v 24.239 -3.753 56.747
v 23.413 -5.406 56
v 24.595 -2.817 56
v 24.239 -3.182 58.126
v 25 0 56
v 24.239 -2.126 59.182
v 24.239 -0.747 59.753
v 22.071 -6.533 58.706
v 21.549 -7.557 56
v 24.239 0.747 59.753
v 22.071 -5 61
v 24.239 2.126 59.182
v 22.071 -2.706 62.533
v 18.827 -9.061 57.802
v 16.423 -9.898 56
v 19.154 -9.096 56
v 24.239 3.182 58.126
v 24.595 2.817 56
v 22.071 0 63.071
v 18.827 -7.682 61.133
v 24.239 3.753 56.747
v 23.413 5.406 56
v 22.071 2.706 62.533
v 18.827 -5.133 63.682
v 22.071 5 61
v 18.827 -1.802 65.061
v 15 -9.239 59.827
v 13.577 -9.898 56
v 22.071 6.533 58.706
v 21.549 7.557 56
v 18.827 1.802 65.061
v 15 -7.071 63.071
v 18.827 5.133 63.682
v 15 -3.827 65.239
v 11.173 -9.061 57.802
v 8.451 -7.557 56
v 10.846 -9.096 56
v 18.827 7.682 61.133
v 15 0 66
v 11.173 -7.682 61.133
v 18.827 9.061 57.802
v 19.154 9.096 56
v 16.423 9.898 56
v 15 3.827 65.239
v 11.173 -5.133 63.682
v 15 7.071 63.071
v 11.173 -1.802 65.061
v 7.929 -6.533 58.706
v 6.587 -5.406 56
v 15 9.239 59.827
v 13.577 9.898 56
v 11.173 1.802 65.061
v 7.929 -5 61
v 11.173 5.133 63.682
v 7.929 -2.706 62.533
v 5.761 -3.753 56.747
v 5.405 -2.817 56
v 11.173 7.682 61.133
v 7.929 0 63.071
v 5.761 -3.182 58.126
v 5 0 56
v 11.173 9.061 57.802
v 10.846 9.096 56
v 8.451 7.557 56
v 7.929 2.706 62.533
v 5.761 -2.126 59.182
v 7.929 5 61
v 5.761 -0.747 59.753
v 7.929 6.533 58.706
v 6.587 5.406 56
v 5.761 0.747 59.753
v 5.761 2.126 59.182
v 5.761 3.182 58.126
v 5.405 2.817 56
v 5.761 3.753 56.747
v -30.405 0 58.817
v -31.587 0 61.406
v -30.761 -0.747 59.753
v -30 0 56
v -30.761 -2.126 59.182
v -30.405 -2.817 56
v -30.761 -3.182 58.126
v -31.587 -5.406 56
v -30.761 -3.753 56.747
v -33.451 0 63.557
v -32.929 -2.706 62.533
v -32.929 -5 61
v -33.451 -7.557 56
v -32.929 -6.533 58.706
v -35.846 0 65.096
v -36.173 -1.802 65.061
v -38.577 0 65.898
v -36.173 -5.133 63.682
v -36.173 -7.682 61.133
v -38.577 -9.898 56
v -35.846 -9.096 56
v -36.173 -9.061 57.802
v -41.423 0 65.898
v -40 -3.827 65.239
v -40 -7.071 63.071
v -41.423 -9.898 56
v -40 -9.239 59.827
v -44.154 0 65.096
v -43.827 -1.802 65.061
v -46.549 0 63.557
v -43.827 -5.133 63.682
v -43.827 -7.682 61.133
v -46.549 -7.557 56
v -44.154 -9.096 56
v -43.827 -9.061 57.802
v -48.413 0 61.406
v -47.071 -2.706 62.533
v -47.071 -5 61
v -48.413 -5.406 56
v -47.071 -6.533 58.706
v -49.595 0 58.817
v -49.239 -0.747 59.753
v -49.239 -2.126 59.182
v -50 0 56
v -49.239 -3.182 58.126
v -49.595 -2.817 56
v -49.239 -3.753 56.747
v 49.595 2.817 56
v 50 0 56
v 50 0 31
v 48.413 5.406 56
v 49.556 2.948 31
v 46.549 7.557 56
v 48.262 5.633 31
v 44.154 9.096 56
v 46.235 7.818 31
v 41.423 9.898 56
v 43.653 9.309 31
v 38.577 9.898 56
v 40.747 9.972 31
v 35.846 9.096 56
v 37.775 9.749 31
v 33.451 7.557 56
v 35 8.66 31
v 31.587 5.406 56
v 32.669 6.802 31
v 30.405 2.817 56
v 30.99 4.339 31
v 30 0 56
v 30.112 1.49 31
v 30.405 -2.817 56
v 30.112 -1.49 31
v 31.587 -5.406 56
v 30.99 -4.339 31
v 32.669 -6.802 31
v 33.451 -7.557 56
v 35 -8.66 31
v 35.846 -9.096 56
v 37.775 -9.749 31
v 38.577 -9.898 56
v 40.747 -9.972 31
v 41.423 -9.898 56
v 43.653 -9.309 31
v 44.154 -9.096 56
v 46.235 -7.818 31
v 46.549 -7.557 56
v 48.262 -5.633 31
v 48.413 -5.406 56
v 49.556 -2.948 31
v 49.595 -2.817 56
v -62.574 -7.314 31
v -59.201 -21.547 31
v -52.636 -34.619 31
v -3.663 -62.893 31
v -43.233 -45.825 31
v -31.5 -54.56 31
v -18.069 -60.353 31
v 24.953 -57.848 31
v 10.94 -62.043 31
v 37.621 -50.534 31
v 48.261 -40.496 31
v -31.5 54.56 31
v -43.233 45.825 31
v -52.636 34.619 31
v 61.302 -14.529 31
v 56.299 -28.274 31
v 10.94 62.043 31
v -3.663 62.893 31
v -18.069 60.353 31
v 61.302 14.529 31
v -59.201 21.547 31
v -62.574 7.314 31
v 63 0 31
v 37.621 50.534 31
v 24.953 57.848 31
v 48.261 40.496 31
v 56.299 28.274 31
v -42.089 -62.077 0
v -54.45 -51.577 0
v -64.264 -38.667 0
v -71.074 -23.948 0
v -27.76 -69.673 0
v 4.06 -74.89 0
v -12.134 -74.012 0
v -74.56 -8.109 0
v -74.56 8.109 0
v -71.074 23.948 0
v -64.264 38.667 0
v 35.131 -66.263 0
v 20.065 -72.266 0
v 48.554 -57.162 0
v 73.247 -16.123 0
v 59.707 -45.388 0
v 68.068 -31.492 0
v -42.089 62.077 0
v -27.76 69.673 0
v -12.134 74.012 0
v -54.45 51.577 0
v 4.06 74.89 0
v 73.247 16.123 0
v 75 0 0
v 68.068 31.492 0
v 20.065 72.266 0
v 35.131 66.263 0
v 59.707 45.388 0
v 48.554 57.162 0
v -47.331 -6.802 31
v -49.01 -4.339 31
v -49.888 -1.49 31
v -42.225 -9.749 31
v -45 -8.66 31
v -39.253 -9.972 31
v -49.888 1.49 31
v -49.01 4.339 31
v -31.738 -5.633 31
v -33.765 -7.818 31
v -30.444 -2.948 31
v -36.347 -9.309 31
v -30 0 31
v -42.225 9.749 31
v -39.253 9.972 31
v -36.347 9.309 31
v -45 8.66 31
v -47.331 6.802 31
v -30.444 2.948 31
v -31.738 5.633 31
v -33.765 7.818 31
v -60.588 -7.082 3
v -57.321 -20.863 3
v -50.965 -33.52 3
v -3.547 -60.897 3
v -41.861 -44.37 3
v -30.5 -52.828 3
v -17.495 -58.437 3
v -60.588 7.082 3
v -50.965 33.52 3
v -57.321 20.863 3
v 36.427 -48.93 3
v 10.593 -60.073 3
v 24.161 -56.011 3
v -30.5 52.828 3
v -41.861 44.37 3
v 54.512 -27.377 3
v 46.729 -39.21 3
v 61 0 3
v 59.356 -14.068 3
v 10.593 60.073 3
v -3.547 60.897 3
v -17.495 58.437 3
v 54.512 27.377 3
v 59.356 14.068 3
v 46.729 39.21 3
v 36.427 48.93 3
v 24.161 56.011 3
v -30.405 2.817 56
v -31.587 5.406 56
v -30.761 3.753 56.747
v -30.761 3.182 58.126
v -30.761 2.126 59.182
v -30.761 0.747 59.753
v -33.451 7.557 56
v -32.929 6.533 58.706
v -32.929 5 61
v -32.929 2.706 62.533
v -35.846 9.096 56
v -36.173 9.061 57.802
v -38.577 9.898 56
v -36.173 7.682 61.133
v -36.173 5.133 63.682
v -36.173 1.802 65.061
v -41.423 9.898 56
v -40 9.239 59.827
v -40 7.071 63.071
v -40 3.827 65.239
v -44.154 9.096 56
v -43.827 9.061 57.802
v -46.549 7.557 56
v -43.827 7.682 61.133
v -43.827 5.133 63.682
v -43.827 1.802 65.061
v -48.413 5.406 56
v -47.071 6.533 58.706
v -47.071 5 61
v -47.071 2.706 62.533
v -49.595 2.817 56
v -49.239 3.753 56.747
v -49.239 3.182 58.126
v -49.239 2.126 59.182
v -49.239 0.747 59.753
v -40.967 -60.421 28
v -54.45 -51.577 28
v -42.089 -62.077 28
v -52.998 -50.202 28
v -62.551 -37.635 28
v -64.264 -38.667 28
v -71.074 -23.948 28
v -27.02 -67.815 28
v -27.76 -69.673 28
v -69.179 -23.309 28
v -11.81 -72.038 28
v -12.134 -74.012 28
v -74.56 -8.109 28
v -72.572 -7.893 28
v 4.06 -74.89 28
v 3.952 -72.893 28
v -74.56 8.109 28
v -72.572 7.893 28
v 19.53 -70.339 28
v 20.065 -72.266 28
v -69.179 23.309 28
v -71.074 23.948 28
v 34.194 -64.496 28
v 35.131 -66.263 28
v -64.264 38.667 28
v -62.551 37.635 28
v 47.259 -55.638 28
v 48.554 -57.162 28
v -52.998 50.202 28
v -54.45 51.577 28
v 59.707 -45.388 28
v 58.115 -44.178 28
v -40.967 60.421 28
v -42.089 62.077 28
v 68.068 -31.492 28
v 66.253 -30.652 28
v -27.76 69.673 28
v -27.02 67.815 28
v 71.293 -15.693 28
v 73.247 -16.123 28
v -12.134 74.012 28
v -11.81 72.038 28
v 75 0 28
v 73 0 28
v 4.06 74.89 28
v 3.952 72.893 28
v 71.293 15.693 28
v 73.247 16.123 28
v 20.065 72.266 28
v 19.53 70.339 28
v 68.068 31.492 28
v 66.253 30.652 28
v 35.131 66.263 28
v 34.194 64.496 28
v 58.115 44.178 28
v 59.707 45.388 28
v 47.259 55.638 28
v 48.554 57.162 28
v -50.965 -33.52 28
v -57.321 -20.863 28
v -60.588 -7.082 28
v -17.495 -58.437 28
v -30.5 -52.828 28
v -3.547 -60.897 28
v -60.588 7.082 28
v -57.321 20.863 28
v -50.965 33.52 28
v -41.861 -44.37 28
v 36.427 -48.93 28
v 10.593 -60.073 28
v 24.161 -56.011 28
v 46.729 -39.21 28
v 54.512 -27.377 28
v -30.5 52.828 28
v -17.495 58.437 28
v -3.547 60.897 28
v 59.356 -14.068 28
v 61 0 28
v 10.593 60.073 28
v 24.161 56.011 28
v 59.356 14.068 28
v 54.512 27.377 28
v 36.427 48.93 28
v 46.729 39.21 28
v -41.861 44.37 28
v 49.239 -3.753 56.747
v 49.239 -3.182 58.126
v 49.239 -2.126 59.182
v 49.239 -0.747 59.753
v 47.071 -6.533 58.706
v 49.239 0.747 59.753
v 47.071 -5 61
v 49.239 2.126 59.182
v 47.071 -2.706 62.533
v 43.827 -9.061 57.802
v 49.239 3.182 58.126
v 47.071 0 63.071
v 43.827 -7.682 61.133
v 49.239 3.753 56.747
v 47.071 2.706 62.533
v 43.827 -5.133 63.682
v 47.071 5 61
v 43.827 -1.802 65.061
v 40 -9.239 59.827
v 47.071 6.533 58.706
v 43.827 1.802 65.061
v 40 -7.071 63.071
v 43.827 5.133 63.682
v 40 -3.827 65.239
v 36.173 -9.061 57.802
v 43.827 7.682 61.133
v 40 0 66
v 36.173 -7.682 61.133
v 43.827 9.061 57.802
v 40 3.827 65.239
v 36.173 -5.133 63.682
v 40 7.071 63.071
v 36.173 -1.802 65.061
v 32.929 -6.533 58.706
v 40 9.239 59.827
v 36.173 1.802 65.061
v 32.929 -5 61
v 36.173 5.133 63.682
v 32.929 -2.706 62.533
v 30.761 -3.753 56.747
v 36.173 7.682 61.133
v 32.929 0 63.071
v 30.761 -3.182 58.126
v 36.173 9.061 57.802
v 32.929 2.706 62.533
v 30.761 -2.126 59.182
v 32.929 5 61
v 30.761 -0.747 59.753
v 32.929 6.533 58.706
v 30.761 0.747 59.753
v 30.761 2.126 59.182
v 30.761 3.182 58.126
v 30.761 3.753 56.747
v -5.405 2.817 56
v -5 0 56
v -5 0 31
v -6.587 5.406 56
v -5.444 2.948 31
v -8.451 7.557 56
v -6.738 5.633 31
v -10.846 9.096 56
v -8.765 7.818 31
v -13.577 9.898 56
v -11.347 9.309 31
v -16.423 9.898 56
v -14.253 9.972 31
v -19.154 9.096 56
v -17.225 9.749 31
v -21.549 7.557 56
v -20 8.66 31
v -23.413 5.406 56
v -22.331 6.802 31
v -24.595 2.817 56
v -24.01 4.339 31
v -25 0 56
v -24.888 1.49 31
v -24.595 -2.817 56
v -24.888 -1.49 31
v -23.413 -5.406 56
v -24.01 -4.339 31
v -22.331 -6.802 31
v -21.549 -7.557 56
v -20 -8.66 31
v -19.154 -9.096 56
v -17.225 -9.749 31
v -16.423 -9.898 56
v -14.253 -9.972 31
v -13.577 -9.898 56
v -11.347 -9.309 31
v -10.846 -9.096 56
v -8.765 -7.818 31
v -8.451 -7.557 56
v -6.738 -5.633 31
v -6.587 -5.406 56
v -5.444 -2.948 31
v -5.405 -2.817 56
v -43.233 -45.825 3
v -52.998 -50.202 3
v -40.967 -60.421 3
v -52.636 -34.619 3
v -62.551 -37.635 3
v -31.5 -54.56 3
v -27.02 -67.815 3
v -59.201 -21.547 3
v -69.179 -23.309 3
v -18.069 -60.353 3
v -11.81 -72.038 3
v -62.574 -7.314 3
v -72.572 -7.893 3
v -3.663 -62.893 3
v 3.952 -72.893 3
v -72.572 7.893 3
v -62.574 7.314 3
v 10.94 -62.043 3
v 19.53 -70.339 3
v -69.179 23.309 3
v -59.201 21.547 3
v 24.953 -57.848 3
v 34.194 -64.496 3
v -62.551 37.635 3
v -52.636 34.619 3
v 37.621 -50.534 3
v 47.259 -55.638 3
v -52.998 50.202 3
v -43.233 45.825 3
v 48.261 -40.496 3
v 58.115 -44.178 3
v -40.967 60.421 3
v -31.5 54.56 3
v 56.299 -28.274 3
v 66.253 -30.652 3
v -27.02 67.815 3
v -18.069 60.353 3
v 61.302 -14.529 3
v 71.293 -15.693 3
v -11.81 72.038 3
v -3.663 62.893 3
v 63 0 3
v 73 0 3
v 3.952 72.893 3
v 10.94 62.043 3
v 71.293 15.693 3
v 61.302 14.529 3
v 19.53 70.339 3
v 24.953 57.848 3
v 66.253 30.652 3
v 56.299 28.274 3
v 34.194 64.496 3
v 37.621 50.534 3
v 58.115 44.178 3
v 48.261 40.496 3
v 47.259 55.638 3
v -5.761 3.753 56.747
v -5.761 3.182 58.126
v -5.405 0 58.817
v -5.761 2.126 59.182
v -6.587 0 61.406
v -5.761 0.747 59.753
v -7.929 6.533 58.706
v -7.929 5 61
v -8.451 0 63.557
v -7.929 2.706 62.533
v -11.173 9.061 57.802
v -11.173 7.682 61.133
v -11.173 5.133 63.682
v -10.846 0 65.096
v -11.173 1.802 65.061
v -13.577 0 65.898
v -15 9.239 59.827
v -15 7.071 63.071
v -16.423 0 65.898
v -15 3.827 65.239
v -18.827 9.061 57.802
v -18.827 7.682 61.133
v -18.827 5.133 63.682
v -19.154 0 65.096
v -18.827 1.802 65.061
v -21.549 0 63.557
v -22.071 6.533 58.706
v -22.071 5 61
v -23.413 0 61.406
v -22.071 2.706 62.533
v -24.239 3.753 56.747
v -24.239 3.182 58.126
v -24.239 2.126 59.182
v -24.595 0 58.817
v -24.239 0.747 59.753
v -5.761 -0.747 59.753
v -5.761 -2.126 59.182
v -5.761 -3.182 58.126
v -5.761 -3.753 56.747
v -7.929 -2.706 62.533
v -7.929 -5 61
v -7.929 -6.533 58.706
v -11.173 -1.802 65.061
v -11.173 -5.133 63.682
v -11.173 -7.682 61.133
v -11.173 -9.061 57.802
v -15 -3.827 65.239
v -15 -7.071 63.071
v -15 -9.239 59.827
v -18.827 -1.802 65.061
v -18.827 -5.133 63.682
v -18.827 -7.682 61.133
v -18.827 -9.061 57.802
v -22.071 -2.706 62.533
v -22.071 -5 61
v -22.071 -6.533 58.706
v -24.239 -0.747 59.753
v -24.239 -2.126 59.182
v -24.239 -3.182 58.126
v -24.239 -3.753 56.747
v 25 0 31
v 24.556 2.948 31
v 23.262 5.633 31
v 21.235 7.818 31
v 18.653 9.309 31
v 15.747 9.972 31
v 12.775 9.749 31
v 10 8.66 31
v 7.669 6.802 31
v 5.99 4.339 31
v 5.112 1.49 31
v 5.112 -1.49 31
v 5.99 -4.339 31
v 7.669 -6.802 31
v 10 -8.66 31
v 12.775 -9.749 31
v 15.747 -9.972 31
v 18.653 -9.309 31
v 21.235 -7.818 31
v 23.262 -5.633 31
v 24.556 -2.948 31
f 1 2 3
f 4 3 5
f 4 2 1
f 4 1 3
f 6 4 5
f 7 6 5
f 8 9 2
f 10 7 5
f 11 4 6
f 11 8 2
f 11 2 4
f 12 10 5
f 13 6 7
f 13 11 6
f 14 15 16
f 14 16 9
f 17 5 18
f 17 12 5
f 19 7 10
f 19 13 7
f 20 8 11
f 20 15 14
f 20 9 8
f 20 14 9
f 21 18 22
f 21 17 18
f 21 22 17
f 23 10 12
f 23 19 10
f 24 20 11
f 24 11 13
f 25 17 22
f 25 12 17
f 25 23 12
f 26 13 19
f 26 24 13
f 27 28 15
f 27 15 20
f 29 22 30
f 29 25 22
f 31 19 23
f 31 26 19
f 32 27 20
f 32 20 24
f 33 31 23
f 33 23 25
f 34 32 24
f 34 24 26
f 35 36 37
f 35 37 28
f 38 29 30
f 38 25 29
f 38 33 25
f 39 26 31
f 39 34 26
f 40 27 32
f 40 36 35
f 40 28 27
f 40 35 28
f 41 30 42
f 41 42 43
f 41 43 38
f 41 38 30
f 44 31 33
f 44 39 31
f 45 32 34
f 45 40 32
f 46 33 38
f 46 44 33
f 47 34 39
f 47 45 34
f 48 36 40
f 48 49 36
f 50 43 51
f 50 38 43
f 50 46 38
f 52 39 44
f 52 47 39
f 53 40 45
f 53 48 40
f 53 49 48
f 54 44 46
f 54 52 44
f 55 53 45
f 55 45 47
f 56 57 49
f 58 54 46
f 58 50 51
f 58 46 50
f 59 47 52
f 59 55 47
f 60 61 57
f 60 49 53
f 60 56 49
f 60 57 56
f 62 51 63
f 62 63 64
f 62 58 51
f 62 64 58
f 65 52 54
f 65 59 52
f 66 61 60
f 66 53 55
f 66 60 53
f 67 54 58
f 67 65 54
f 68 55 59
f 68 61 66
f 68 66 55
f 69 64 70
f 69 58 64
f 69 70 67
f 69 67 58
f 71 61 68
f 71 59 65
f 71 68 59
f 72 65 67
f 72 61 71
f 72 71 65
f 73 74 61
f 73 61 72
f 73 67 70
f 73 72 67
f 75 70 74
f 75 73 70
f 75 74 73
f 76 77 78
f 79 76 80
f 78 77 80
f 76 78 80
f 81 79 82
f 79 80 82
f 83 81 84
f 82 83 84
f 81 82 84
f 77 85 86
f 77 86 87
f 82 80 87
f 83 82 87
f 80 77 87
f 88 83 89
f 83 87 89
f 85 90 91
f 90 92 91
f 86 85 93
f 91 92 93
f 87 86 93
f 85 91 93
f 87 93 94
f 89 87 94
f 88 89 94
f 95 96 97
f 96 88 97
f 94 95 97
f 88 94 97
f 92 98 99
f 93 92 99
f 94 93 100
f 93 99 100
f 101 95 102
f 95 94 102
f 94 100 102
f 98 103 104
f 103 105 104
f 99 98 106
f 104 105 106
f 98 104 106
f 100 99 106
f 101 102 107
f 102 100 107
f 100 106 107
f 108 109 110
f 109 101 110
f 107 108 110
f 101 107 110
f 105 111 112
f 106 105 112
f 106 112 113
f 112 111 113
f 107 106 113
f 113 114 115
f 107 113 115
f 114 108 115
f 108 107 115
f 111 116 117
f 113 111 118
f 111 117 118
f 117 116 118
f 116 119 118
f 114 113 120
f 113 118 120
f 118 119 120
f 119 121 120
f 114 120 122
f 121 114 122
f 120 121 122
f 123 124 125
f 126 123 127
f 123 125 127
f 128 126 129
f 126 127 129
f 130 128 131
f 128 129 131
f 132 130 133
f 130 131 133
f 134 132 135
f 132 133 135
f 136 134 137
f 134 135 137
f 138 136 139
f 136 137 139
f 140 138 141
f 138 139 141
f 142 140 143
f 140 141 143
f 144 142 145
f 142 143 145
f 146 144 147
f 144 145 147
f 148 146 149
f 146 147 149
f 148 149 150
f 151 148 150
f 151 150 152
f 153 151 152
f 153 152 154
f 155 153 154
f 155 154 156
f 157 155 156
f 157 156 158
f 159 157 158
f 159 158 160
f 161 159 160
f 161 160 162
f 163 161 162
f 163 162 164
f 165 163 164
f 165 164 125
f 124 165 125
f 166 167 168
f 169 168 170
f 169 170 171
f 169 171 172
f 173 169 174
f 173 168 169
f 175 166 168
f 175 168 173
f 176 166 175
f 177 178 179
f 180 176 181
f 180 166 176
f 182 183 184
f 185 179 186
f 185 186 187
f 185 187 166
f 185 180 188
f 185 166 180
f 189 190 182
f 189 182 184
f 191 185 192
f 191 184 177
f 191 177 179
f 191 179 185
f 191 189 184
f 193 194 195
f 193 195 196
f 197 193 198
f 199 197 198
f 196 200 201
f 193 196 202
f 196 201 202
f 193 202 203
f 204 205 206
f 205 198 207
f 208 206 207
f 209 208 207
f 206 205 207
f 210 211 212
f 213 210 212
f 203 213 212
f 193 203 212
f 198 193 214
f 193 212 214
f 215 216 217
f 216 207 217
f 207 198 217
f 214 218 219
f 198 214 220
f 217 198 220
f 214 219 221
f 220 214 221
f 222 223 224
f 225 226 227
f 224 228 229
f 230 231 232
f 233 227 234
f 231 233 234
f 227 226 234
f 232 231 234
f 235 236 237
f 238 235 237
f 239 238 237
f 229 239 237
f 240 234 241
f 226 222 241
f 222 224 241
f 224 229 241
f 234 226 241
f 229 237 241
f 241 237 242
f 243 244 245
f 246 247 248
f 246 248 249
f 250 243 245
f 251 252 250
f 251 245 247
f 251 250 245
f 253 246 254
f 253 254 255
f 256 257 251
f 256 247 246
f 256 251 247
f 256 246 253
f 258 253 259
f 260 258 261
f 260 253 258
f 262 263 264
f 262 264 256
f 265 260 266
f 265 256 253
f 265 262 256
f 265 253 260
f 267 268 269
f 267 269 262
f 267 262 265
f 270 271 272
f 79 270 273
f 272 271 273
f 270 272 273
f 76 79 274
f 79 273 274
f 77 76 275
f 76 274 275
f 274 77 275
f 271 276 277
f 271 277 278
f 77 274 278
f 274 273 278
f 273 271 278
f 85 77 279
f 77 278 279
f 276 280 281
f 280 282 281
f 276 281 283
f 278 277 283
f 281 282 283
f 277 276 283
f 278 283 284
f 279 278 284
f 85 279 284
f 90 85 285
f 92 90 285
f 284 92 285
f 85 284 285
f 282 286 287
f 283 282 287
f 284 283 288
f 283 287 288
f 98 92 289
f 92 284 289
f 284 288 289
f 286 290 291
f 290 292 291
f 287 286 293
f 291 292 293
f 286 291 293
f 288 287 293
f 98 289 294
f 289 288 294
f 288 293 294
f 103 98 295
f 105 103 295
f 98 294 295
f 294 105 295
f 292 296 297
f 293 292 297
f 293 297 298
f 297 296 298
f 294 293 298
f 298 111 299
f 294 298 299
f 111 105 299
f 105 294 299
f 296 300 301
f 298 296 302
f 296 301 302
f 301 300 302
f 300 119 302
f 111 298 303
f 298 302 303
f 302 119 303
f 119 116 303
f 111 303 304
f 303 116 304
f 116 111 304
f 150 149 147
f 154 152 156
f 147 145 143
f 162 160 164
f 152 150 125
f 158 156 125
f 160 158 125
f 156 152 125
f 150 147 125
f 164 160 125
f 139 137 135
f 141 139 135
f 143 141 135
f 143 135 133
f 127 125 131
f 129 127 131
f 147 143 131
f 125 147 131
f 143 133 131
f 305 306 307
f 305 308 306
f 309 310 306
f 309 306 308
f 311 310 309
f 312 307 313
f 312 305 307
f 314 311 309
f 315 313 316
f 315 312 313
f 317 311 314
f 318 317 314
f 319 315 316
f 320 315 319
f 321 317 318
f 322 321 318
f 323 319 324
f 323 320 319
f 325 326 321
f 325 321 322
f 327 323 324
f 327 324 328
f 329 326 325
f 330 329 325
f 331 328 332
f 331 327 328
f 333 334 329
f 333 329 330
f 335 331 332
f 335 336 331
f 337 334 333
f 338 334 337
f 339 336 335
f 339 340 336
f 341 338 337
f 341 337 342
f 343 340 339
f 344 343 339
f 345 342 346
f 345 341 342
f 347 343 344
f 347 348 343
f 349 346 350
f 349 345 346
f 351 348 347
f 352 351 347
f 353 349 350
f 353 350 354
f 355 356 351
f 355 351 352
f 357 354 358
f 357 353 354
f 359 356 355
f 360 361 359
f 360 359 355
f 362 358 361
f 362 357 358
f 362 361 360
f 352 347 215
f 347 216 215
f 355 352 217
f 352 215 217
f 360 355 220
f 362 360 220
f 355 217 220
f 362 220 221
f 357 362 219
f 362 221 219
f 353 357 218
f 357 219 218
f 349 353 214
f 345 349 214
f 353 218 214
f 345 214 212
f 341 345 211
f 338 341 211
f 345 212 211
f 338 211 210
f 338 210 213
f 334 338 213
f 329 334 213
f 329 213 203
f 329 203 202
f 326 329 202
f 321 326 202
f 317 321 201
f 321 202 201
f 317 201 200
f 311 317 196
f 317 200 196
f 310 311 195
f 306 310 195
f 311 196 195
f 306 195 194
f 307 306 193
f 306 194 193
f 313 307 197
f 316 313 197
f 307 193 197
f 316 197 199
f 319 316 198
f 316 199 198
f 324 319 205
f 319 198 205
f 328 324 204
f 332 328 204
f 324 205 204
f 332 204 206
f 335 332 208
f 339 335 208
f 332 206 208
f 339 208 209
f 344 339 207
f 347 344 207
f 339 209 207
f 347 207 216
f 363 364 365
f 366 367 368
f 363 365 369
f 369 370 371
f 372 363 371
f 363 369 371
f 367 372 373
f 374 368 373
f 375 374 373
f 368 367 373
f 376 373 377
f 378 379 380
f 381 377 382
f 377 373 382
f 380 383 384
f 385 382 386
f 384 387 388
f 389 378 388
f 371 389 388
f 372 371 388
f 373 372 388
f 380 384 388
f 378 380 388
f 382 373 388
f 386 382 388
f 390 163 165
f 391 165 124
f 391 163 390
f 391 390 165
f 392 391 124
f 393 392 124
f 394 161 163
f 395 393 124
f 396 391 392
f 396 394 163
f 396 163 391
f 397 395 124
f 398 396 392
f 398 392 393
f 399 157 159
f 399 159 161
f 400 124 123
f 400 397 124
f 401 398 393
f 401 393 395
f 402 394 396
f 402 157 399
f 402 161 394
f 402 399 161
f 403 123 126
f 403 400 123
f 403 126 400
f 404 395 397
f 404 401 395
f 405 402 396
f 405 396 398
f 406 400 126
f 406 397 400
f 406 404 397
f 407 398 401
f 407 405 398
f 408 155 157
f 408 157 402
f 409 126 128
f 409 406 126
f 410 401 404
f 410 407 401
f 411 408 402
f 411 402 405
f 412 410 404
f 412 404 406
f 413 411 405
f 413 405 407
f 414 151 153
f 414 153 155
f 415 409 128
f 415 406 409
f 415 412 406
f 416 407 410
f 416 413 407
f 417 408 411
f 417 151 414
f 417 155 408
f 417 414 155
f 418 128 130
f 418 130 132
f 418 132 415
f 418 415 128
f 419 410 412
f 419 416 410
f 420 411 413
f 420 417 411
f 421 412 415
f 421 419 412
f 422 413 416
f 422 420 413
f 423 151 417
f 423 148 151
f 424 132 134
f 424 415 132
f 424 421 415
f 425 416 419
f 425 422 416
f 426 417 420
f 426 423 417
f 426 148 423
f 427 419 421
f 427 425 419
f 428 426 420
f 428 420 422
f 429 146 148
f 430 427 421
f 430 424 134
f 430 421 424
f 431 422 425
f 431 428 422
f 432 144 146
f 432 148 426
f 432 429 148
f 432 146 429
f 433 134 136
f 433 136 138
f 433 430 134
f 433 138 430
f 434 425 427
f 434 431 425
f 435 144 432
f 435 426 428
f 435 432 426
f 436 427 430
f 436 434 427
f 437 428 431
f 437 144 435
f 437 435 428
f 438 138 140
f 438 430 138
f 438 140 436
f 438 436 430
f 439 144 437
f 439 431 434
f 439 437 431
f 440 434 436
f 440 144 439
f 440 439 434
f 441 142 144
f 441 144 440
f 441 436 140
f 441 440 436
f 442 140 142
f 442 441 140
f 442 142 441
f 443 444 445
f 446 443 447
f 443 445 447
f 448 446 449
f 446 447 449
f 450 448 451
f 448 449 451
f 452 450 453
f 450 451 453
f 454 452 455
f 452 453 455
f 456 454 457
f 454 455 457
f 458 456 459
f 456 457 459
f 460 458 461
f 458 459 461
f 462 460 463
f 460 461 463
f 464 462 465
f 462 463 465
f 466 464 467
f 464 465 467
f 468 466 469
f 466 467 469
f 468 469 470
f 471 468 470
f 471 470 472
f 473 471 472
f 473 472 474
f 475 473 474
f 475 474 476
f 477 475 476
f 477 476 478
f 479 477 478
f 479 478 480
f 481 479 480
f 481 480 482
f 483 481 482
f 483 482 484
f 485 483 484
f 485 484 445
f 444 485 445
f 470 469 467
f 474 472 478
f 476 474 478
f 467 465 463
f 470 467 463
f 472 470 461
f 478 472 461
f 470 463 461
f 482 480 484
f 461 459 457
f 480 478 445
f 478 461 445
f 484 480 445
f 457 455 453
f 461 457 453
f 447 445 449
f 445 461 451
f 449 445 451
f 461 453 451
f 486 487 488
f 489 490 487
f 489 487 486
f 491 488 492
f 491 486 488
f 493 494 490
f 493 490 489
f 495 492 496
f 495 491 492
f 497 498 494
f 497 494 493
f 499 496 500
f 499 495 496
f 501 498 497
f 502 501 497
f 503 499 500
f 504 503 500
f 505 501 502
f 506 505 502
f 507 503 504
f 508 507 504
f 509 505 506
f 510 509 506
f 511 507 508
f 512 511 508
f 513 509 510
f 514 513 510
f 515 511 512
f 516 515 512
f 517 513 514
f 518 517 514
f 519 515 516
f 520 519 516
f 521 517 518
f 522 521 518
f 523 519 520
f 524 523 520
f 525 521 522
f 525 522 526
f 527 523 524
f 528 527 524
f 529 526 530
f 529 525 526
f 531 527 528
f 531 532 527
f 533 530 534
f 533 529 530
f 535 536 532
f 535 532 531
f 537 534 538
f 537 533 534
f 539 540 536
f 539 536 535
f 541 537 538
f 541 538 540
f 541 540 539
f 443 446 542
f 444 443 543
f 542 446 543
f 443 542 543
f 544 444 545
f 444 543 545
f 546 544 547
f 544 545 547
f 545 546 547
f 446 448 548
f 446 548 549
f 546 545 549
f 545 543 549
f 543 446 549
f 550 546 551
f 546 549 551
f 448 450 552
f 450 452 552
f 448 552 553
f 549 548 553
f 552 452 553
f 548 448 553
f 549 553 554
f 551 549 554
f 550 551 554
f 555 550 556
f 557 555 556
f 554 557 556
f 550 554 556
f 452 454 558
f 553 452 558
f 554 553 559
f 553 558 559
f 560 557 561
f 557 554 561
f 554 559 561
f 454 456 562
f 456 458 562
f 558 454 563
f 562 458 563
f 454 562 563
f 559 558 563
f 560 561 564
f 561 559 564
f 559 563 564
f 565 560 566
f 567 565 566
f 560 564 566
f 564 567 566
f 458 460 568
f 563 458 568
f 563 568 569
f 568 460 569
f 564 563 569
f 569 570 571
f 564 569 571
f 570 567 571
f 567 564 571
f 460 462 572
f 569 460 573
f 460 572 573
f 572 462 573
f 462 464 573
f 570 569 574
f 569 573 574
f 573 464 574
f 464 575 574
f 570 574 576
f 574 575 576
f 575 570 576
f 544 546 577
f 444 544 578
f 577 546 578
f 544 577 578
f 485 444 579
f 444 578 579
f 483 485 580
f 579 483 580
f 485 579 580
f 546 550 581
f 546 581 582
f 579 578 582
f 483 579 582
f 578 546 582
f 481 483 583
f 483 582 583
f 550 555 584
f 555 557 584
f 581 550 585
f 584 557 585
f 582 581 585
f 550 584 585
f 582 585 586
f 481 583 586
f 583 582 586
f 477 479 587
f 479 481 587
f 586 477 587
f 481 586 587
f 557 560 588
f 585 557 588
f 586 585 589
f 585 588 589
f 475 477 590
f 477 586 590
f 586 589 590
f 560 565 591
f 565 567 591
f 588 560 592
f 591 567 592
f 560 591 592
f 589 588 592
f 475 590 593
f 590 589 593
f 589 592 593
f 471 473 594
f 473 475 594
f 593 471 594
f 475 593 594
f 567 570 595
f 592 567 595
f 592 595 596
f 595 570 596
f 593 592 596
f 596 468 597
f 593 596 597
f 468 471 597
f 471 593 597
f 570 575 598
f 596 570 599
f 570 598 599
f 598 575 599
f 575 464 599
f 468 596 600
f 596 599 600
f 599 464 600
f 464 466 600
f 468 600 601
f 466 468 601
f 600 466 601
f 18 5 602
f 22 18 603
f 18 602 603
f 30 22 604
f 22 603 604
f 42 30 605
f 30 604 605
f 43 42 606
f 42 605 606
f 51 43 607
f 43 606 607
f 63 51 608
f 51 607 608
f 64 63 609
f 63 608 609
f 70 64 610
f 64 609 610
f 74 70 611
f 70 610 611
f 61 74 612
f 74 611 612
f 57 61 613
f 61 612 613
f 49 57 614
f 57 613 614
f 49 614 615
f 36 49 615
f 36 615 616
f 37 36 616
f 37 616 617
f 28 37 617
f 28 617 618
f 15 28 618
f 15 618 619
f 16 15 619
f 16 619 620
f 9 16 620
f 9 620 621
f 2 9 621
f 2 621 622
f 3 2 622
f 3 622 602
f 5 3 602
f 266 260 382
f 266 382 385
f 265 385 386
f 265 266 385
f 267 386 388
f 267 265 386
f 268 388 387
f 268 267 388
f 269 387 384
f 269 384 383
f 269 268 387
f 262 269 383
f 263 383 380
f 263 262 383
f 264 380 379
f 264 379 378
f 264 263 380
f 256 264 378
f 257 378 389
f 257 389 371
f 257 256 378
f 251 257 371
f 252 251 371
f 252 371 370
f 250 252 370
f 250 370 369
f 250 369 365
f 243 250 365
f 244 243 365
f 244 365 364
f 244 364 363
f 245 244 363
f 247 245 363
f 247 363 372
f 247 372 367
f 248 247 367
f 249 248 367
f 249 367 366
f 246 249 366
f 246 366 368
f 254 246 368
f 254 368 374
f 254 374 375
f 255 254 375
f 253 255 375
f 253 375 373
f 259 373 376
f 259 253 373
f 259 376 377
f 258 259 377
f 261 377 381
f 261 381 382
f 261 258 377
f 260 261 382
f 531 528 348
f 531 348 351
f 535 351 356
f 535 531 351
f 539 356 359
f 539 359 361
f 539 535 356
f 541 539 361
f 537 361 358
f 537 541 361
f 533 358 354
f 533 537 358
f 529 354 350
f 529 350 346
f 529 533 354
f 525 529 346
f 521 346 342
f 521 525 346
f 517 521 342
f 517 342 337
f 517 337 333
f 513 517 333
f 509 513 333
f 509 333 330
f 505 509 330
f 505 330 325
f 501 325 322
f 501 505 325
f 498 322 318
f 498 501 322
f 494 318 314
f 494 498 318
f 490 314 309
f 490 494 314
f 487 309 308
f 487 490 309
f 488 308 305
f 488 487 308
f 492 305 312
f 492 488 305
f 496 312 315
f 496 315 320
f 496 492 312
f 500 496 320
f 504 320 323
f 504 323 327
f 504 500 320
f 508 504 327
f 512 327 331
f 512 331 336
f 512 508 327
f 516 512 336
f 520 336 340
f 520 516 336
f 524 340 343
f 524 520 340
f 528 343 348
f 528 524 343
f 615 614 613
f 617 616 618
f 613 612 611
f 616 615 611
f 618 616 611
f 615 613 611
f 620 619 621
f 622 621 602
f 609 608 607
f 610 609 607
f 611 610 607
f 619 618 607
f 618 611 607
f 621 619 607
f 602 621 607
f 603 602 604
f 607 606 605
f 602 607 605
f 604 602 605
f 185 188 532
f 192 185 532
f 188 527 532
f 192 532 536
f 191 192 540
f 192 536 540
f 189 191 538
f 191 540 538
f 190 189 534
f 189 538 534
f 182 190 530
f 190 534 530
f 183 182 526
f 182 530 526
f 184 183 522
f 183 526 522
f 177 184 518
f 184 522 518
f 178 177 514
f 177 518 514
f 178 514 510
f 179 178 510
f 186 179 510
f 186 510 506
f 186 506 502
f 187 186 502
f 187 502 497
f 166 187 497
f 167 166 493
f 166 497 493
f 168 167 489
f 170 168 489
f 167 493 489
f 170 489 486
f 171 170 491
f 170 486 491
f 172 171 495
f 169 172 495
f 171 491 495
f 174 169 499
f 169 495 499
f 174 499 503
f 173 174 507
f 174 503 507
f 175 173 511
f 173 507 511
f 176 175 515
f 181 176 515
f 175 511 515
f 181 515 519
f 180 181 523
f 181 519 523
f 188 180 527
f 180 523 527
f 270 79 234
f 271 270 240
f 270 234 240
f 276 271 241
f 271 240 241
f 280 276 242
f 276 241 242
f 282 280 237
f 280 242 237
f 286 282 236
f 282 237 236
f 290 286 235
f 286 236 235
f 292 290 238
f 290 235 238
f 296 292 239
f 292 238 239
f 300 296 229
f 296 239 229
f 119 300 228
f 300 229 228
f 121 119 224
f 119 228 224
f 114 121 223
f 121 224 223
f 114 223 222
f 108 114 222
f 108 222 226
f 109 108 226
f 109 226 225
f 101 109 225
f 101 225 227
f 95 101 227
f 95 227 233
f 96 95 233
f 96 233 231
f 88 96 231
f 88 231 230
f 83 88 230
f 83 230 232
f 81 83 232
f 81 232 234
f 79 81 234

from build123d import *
from build123d import SkipClean  # not in build123d's __all__

# Parameters (mm, degrees)
F0_R     = 75
F0_R_2   = 73
F0_R_3   = 63
F0_R_4   = 61
F1_DEPTH = 3
F2_R     = 75
F2_R_2   = 73
F2_R_3   = 63
F2_R_4   = 61
F3_DEPTH = 25
F4_DEPTH = 3
F5_R     = 63
F5_R_2   = 61
F6_DEPTH = 3
F7_R     = 10
F8_DEPTH = 25


with BuildPart() as f1:
    # F0 (on Top) → F1 (new body)
    with BuildSketch(Plane.XY):
        Circle(F0_R)
        Circle(F0_R_2, mode=Mode.SUBTRACT)
        Circle(F0_R_2)
        Circle(F0_R_3, mode=Mode.SUBTRACT)
        Circle(F0_R_3)
        Circle(F0_R_4, mode=Mode.SUBTRACT)
    extrude(amount=F1_DEPTH)

    # F2 (on face) → F3 (join)
    with BuildSketch(Plane.XY.offset(3)):
        Circle(F2_R)
        Circle(F2_R_2, mode=Mode.SUBTRACT)
        Circle(F2_R_3)
        Circle(F2_R_4, mode=Mode.SUBTRACT)
    extrude(amount=F3_DEPTH)

    # F0 (on Top) → F4 (join)
    with BuildSketch(Plane.XY):
        Circle(F0_R_4)
    extrude(amount=F4_DEPTH)

    # F5 (on face) → F6 (join)
    with BuildSketch(Plane.XY.offset(28)):
        Circle(F5_R)
        Circle(F5_R_2, mode=Mode.SUBTRACT)
        Circle(F5_R_2)
    extrude(amount=F6_DEPTH)


with BuildPart() as f8:
    # F7 (on face) → F8 (new body)
    with BuildSketch(Plane.XY.offset(31)):
        with Locations((-40, 0)):
            Circle(F7_R)
    extrude(amount=F8_DEPTH)

    # F9 (on Front) → F10 (revolve)
    with BuildSketch(Plane.XZ):
        with BuildLine():
            ThreePointArc((-30, 56), (-40, 66), (-50, 56))
            Line((-50, 56), (-30, 56))
        make_face()
    with SkipClean():  # cleaning this boolean's faces spoils the solid; the shape is the same uncleaned
        revolve(axis=Axis((-40, 0, 56), (1, 0, 0)))


with BuildPart() as f8b:
    # F7 (on face) → F8, piece 2 (new body)
    with BuildSketch(Plane.XY.offset(31)):
        with Locations((-15, 0)):
            Circle(F7_R)
    extrude(amount=F8_DEPTH)

    # F9 (on Front) → F11 (revolve)
    with BuildSketch(Plane.XZ):
        with BuildLine():
            ThreePointArc((-5, 56), (-15, 66), (-25, 56))
            Line((-25, 56), (-5, 56))
        make_face()
    with SkipClean():  # cleaning this boolean's faces spoils the solid; the shape is the same uncleaned
        revolve(axis=Axis((-15, 0, 56), (1, 0, 0)))


with BuildPart() as f8c:
    # F7 (on face) → F8, piece 3 (new body)
    with BuildSketch(Plane.XY.offset(31)):
        with Locations((15, 0)):
            Circle(F7_R)
    extrude(amount=F8_DEPTH)

    # F9 (on Front) → F12 (revolve)
    with BuildSketch(Plane.XZ):
        with BuildLine():
            Line((5, 56), (25, 56))
            ThreePointArc((25, 56), (15, 66), (5, 56))
        make_face()
    revolve(axis=Axis((15, 0, 56), (-1, 0, 0)))


with BuildPart() as f8d:
    # F7 (on face) → F8, piece 4 (new body)
    with BuildSketch(Plane.XY.offset(31)):
        with Locations((40, 0)):
            Circle(F7_R)
    extrude(amount=F8_DEPTH)

    # F9 (on Front) → F13 (revolve)
    with BuildSketch(Plane.XZ):
        with BuildLine():
            Line((30, 56), (50, 56))
            ThreePointArc((50, 56), (40, 66), (30, 56))
        make_face()
    revolve(axis=Axis((40, 0, 56), (-1, 0, 0)))


solid = Compound([f1.part, f8.part, f8b.part, f8c.part, f8d.part])
